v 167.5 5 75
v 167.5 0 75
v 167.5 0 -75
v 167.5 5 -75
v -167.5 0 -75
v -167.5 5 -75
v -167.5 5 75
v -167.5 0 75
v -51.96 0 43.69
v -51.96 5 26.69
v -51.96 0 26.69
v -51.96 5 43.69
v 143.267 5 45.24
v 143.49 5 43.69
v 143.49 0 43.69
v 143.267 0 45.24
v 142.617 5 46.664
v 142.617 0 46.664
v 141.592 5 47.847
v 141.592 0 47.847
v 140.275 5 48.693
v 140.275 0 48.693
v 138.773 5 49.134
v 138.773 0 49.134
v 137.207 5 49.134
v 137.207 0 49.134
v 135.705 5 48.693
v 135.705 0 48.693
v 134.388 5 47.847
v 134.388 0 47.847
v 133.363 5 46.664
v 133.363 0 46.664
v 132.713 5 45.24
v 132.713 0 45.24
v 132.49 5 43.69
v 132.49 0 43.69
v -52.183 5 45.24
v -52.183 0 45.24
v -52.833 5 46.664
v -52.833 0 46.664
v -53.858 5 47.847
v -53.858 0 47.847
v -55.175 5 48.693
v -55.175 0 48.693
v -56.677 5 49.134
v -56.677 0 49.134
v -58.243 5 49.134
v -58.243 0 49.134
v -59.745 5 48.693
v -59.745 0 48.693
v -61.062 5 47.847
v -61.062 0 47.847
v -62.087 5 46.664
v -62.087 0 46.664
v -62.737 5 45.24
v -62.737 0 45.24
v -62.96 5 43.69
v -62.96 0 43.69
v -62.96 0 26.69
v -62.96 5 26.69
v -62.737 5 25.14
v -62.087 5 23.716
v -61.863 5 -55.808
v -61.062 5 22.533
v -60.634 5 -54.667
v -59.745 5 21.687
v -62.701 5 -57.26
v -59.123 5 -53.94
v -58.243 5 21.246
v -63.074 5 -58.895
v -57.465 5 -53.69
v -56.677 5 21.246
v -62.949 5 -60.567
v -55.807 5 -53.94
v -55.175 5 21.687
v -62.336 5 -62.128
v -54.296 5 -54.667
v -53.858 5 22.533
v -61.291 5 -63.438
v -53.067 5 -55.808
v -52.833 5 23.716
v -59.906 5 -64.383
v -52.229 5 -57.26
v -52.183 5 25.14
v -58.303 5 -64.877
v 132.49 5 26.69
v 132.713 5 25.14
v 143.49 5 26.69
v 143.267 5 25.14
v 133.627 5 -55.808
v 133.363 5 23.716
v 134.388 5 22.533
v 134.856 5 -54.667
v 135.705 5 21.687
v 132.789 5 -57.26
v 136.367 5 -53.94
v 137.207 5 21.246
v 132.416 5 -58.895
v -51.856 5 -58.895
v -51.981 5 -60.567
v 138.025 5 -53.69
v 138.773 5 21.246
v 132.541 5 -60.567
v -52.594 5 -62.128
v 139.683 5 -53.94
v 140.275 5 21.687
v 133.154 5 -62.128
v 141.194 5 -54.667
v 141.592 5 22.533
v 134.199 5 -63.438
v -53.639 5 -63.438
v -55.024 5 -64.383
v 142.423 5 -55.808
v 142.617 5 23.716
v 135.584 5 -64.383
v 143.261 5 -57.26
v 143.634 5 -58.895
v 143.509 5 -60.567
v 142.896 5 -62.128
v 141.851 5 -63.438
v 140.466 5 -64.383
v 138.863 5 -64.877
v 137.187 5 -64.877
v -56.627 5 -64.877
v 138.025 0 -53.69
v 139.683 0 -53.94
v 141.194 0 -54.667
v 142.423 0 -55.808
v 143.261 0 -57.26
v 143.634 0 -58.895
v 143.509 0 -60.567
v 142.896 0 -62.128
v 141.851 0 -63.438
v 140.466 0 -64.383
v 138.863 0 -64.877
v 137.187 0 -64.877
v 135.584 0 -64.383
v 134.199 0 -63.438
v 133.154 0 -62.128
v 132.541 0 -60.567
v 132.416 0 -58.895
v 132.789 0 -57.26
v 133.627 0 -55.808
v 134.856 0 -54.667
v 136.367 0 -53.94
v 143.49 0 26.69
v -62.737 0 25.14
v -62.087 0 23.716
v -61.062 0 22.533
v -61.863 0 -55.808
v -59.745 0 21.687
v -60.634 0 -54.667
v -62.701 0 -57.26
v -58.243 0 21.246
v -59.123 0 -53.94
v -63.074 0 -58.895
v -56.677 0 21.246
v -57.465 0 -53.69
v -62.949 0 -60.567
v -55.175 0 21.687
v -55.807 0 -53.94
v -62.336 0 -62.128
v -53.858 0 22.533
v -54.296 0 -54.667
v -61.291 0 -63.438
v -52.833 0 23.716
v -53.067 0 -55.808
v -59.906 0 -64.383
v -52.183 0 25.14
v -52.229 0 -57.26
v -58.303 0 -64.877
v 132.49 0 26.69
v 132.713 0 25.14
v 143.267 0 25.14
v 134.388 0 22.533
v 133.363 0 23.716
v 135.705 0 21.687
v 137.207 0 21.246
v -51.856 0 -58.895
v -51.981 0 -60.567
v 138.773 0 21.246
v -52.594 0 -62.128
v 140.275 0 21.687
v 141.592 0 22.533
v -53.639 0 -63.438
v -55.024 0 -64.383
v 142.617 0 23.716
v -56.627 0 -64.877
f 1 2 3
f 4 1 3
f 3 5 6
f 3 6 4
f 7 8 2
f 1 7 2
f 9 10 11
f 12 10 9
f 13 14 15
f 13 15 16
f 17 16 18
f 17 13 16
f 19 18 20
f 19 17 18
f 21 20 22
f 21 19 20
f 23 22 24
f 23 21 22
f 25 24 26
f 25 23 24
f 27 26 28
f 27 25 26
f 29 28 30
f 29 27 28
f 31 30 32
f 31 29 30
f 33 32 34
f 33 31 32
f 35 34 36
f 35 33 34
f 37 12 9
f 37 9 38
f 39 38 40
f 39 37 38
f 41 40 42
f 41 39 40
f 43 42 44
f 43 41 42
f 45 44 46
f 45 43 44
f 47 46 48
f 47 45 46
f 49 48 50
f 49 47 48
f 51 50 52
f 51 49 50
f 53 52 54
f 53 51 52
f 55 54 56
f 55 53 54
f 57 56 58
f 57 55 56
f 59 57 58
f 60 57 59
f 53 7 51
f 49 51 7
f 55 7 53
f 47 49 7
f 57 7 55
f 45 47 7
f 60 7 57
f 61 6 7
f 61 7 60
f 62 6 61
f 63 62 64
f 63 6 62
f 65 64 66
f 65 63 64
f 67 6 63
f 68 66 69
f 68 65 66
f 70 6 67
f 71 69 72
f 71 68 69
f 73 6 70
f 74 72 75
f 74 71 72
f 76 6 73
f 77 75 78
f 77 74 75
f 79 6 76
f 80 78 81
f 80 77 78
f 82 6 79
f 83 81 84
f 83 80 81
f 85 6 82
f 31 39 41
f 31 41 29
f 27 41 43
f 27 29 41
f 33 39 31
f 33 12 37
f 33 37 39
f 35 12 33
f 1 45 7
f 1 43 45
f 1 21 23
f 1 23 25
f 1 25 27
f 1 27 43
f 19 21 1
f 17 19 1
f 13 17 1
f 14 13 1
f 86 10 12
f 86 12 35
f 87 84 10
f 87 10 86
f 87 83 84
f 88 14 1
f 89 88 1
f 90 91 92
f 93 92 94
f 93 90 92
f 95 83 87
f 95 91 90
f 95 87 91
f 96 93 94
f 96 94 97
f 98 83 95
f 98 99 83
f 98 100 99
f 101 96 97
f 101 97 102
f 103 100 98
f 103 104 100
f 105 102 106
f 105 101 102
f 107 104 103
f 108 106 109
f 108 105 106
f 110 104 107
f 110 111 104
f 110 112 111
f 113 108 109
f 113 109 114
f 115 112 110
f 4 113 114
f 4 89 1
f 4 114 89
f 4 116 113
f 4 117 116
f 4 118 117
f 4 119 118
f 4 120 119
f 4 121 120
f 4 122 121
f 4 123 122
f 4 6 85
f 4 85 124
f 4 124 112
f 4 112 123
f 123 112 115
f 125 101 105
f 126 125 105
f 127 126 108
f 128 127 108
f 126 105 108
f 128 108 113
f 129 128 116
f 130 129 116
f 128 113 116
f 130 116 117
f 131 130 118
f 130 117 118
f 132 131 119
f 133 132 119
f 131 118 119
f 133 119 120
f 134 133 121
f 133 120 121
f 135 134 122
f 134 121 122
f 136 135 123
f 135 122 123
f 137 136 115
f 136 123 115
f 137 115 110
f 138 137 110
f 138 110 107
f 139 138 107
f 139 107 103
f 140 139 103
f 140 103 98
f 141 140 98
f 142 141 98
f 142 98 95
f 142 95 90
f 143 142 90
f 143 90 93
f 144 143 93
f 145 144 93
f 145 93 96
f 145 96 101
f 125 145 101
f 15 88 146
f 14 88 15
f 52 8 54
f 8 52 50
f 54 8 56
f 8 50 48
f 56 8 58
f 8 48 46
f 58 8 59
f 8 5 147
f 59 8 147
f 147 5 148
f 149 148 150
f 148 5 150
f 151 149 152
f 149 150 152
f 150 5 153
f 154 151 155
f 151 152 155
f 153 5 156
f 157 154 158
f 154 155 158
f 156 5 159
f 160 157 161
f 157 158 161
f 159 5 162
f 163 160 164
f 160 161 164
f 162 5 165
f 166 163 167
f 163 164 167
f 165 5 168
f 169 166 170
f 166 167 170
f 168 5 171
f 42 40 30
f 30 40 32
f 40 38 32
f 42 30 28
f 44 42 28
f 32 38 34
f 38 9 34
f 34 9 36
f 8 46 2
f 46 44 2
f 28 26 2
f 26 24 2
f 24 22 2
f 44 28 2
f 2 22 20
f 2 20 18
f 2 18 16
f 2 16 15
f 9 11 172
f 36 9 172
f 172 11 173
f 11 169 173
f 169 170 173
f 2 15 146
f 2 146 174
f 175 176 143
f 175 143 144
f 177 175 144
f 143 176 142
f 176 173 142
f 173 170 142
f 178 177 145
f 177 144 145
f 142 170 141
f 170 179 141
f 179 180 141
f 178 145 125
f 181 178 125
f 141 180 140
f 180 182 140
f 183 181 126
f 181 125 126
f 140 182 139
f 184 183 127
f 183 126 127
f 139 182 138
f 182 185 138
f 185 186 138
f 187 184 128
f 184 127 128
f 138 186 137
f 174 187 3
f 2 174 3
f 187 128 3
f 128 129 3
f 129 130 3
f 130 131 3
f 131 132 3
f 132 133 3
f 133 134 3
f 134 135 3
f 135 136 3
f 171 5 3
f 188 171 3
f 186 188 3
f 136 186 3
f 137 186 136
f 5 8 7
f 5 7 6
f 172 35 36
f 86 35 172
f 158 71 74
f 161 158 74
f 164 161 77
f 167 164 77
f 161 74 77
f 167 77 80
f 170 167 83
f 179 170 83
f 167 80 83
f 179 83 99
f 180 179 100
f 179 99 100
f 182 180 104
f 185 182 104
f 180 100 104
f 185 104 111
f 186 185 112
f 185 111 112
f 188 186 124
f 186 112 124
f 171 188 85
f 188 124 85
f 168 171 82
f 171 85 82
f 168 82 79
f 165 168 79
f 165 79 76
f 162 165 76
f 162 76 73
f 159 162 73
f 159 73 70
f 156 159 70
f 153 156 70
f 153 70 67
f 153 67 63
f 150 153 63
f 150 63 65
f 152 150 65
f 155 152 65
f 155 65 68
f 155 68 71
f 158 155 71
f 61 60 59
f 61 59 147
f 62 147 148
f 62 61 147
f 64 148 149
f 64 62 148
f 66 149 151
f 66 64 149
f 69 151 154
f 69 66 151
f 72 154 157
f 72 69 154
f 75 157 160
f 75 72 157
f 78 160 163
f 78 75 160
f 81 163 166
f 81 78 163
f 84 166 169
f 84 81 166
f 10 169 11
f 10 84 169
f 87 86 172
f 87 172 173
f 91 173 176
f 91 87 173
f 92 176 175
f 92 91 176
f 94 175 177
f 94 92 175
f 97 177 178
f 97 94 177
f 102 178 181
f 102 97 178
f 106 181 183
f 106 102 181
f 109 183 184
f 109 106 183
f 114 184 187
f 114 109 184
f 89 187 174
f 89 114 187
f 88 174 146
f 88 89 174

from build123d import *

# Parameters (mm, degrees)
SKETCH1_W           = 335
SKETCH1_H           = 150
BOSS_EXTRUDE1_DEPTH = 5
SKETCH2_R           = 5.625
CUT_EXTRUDE1_DEPTH  = 10


with BuildPart() as part:
    # Sketch1 → Boss-Extrude1 (new body)
    with BuildSketch(Plane(origin=(0, 0, 0), x_dir=(1, 0, 0), z_dir=(0, 1, 0))):
        Rectangle(SKETCH1_W, SKETCH1_H)
    extrude(amount=BOSS_EXTRUDE1_DEPTH)

    # Sketch2 → Cut-Extrude1 (cut)
    with BuildSketch(Plane(origin=(0, 5, 0), x_dir=(1, 0, 0), z_dir=(0, 1, 0))):
        with Locations(Location((138.025, 59.315, 0), (0, 0, 270))):
            Circle(SKETCH2_R)
        with Locations(Location((-57.465, 59.315, 0), (0, 0, 270))):
            Circle(SKETCH2_R)
        with BuildLine():
            Line((143.49, -26.69), (143.49, -43.69))
            ThreePointArc((143.49, -43.69), (137.99, -49.19), (132.49, -43.69))
            Line((132.49, -43.69), (132.49, -26.69))
            ThreePointArc((132.49, -26.69), (137.99, -21.19), (143.49, -26.69))
        make_face()
        with BuildLine():
            Line((-51.96, -26.69), (-51.96, -43.69))
            ThreePointArc((-51.96, -43.69), (-57.46, -49.19), (-62.96, -43.69))
            Line((-62.96, -43.69), (-62.96, -26.69))
            ThreePointArc((-62.96, -26.69), (-57.46, -21.19), (-51.96, -26.69))
        make_face()
    extrude(amount=-CUT_EXTRUDE1_DEPTH, mode=Mode.SUBTRACT)


solid = part.part
